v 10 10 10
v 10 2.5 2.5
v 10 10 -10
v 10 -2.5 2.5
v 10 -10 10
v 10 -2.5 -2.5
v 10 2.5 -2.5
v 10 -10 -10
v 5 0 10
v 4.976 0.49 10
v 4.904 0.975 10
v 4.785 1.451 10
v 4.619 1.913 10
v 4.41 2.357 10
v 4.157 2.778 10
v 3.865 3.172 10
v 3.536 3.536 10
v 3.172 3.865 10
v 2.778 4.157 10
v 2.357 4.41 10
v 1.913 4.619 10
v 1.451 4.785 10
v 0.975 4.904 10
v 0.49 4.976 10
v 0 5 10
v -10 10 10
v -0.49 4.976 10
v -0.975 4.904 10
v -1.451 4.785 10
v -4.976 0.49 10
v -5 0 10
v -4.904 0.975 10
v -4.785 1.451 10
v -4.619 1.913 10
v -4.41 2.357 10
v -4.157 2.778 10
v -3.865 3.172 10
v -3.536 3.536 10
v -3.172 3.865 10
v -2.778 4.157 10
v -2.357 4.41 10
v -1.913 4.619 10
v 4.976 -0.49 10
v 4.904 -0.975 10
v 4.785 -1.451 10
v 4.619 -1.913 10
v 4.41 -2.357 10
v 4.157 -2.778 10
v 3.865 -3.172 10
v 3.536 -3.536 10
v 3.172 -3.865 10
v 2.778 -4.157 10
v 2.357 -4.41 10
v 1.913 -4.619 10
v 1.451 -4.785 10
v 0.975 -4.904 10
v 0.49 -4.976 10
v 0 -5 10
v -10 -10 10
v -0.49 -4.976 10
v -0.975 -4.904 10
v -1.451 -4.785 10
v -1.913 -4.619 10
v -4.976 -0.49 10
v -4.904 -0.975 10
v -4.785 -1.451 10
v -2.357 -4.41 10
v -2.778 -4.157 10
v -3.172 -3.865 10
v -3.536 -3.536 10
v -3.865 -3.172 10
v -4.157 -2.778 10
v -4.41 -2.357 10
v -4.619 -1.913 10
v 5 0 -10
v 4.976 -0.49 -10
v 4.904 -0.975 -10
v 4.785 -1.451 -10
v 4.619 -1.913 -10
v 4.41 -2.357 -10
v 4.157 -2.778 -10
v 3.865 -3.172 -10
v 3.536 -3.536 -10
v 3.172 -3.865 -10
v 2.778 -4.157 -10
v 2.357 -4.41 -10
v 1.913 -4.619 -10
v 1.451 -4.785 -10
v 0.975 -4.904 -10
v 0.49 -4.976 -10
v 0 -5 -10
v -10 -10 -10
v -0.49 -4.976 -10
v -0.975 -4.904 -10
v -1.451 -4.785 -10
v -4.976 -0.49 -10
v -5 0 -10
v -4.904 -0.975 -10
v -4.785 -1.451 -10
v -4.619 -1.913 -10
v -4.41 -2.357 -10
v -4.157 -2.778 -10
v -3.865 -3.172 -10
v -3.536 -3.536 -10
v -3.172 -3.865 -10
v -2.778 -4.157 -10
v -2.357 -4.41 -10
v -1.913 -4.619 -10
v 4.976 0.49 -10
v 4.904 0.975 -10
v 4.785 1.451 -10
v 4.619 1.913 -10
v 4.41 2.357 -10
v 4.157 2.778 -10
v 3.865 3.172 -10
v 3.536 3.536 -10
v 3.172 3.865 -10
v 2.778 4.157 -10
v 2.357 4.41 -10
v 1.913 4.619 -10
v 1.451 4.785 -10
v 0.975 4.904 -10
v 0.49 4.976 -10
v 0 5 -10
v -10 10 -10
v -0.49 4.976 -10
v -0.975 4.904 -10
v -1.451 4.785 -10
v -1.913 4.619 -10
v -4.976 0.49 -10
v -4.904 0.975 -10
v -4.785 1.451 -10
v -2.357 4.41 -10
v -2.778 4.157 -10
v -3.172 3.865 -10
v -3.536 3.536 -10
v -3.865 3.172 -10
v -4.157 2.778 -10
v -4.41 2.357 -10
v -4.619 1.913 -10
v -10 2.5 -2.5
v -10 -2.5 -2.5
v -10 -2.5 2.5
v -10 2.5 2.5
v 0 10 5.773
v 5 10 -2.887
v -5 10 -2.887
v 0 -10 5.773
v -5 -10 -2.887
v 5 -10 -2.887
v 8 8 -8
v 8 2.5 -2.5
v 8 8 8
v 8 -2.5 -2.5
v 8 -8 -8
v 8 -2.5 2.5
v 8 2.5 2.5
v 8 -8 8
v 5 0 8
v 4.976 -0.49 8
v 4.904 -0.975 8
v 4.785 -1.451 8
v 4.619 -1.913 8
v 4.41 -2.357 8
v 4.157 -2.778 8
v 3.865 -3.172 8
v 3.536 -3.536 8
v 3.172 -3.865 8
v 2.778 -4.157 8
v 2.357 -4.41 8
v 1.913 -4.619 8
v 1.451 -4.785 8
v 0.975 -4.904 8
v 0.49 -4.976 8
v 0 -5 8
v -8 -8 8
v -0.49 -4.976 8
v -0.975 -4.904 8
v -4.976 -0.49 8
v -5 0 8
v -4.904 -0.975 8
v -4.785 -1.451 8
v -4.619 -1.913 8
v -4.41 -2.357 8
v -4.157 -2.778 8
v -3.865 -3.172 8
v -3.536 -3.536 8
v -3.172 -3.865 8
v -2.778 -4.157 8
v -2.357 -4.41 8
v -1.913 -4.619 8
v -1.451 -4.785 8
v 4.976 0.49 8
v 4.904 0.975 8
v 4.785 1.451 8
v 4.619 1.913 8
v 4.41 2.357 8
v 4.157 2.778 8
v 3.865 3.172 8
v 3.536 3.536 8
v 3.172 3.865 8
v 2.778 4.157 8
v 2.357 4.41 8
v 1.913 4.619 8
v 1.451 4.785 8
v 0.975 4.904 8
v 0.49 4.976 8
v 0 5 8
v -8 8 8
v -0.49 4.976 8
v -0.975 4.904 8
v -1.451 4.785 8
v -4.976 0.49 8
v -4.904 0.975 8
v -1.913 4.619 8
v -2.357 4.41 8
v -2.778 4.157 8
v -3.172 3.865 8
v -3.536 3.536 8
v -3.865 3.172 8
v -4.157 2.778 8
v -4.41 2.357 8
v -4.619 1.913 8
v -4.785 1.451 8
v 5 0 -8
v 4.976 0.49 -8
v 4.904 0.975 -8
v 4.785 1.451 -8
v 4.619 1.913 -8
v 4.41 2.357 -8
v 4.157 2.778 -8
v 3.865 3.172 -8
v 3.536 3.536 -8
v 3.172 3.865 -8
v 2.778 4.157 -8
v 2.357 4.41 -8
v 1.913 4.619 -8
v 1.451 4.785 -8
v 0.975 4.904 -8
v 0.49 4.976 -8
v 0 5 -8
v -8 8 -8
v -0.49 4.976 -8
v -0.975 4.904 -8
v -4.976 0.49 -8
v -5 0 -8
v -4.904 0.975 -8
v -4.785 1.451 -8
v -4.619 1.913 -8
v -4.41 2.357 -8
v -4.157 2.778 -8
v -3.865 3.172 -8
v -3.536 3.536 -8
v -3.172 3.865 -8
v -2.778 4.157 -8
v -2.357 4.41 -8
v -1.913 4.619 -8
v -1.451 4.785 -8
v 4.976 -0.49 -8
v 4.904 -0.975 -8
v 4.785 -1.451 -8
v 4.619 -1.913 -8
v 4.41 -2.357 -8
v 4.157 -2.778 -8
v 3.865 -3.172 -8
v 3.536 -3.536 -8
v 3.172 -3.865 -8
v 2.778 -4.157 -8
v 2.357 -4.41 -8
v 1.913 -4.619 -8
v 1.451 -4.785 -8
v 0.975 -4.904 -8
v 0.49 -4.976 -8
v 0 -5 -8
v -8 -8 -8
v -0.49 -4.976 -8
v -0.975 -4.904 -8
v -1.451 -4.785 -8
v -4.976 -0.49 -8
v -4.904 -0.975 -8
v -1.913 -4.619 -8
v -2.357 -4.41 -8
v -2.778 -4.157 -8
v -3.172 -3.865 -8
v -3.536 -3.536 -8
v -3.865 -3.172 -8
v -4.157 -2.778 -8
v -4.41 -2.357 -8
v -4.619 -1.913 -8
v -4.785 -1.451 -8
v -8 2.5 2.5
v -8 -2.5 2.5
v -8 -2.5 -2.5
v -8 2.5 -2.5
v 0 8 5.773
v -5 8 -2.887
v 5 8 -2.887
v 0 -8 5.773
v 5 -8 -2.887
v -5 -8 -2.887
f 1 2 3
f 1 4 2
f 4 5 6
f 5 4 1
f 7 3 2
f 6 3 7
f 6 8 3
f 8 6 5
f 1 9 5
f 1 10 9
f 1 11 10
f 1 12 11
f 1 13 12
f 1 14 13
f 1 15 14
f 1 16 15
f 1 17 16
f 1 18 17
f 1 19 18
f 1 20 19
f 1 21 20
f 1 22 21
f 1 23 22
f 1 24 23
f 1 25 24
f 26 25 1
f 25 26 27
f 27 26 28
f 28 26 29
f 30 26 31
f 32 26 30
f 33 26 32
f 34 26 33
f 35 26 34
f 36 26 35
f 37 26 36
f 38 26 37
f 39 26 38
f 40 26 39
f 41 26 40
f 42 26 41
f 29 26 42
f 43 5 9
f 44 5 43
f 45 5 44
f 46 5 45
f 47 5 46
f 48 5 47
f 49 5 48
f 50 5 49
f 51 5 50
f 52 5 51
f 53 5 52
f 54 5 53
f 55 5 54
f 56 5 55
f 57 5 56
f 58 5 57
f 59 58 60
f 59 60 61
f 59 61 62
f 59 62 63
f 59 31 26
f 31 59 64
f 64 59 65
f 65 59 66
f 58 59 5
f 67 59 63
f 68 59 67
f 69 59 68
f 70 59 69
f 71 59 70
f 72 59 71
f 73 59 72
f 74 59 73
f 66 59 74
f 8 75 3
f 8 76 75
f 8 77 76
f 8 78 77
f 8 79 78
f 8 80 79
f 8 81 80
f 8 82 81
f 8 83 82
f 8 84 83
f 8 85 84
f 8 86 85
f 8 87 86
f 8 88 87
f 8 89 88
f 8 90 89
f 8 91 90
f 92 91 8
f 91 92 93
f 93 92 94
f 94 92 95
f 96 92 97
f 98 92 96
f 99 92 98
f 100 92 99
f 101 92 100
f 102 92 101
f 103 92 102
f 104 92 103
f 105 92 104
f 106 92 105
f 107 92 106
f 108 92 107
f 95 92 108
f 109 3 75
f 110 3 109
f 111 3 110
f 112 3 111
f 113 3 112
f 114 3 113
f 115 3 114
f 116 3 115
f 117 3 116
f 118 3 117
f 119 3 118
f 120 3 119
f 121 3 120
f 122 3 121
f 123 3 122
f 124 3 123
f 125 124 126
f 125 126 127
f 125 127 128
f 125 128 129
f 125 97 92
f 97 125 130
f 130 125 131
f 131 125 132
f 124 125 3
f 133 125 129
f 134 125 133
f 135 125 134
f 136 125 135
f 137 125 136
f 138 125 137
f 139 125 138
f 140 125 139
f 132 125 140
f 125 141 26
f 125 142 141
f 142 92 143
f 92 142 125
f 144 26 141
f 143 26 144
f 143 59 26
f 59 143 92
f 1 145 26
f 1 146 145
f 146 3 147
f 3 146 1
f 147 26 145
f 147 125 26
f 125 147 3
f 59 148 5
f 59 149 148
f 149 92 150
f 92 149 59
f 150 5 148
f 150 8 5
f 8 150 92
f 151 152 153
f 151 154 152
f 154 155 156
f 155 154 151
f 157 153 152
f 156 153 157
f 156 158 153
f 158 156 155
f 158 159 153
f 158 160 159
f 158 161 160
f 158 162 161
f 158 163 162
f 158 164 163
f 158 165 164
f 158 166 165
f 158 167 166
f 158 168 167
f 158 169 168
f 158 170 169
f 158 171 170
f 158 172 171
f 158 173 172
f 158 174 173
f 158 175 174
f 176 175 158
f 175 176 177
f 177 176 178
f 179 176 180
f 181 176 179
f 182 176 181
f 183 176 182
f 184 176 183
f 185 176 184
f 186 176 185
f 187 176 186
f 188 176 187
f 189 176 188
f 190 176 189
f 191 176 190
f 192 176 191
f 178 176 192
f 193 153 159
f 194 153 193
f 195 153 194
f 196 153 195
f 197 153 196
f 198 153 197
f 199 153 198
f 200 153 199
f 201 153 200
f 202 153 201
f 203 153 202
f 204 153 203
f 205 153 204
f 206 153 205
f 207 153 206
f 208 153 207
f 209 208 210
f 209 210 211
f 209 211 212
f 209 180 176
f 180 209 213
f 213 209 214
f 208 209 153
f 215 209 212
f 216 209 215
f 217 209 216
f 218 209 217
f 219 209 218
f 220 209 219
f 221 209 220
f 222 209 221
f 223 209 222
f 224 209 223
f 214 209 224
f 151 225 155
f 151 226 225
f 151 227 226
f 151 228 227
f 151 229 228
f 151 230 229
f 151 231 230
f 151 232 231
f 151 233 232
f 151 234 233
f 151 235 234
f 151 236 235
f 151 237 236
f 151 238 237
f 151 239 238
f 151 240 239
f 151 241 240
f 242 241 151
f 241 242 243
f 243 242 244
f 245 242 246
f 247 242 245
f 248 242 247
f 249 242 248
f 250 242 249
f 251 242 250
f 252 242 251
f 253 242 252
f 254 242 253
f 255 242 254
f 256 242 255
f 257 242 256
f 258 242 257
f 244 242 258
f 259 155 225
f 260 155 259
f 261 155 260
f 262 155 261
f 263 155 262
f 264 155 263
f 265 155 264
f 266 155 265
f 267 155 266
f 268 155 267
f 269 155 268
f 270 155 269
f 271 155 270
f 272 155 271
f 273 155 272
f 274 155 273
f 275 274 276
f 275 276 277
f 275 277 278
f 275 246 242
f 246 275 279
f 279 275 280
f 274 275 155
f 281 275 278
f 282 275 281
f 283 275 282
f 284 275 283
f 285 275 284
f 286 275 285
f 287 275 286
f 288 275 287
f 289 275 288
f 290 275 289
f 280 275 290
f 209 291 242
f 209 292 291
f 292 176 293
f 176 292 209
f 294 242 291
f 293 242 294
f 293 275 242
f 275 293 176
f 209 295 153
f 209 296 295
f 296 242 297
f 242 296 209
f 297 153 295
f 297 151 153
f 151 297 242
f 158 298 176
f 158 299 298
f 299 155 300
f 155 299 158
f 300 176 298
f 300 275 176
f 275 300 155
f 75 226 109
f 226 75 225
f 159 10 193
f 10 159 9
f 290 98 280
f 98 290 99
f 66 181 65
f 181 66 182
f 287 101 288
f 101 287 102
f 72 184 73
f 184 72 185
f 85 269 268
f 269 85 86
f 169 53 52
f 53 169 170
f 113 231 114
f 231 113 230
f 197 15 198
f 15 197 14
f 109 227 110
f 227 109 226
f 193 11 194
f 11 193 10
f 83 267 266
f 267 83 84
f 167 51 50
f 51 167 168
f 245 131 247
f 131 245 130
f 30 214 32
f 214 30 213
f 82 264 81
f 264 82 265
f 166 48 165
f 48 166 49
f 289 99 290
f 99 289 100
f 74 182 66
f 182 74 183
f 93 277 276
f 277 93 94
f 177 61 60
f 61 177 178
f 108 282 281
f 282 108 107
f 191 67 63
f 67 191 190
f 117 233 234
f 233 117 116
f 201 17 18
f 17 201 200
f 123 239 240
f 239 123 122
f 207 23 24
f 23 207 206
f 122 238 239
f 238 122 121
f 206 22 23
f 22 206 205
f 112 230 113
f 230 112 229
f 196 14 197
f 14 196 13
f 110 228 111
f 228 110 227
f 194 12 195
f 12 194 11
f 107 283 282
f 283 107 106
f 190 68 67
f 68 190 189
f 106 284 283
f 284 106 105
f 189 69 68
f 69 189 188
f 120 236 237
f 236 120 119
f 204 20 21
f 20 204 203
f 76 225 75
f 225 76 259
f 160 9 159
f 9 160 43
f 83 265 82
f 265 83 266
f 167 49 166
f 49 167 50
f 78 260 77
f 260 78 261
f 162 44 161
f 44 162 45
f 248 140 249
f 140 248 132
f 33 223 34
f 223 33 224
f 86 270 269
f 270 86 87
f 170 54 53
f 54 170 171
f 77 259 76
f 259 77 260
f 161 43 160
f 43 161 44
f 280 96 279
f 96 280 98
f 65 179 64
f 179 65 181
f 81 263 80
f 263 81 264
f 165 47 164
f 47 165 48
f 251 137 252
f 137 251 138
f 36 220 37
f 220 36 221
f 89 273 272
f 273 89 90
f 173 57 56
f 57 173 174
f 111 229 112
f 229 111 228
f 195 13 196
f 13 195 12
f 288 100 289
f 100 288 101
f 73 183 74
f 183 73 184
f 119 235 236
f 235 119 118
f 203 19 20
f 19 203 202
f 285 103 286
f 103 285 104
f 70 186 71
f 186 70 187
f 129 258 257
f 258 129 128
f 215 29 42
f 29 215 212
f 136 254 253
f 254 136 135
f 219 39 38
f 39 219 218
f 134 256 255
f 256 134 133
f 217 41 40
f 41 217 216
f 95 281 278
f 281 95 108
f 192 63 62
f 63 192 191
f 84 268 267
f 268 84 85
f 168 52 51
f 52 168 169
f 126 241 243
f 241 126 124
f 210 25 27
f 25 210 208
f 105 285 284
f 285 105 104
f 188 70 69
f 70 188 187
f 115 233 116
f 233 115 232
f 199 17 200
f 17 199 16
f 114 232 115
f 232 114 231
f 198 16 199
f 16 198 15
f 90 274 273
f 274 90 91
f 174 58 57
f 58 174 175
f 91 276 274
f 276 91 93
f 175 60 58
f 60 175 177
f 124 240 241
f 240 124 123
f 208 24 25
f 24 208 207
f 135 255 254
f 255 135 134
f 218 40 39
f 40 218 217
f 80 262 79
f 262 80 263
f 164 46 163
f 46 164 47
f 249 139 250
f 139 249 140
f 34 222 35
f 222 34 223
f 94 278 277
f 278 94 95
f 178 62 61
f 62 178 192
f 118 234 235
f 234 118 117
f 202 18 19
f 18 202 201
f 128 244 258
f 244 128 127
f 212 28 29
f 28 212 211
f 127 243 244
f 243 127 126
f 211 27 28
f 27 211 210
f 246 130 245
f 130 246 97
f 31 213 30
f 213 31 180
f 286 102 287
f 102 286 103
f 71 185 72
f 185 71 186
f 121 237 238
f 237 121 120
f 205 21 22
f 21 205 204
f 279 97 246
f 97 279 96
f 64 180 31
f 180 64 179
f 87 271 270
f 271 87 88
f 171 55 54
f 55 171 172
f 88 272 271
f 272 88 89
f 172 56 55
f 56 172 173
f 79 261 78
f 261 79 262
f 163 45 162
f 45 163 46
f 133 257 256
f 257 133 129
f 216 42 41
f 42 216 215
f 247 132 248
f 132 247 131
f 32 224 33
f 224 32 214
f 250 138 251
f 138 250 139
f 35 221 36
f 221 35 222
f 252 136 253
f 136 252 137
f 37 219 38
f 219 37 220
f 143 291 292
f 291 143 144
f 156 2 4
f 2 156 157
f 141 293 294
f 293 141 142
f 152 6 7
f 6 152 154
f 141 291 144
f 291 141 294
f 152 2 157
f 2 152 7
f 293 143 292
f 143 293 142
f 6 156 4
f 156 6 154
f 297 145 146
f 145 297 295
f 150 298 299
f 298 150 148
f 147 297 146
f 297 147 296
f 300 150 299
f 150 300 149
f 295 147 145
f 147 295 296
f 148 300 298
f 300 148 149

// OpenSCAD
// Hollow Cube - 20mm outer size
// Adjust wall_thickness to change shell thickness

outer_size    = 20;   // mm
wall_thickness = 2;   // mm
inner_size    = outer_size - (wall_thickness * 2);

hole_diameter   = 10;  // mm - circular hole (top to bottom)
square_hole_size = 5;  // mm - square hole side (right to left)
triangle_side   = 10;  // mm - equilateral triangle hole side (front to back)

difference() {
    // Outer cube
    cube(outer_size, center = true);

    // Inner cube (hollow cavity)
    cube(inner_size, center = true);

    // Vertical circular hole through top to bottom
    cylinder(h = outer_size + 1, r = hole_diameter / 2, center = true, $fn = 64);

    // Square hole from right to left (along X axis)
    cube([outer_size + 1, square_hole_size, square_hole_size], center = true);

    // Equilateral triangle hole from front to back (along Y axis)
    rotate([90, 0, 0])
        linear_extrude(height = outer_size + 1, center = true)
            polygon([
                [-triangle_side/2, -triangle_side*sqrt(3)/6],
                [ triangle_side/2, -triangle_side*sqrt(3)/6],
                [0,                 triangle_side*sqrt(3)/3]
            ]);
}
